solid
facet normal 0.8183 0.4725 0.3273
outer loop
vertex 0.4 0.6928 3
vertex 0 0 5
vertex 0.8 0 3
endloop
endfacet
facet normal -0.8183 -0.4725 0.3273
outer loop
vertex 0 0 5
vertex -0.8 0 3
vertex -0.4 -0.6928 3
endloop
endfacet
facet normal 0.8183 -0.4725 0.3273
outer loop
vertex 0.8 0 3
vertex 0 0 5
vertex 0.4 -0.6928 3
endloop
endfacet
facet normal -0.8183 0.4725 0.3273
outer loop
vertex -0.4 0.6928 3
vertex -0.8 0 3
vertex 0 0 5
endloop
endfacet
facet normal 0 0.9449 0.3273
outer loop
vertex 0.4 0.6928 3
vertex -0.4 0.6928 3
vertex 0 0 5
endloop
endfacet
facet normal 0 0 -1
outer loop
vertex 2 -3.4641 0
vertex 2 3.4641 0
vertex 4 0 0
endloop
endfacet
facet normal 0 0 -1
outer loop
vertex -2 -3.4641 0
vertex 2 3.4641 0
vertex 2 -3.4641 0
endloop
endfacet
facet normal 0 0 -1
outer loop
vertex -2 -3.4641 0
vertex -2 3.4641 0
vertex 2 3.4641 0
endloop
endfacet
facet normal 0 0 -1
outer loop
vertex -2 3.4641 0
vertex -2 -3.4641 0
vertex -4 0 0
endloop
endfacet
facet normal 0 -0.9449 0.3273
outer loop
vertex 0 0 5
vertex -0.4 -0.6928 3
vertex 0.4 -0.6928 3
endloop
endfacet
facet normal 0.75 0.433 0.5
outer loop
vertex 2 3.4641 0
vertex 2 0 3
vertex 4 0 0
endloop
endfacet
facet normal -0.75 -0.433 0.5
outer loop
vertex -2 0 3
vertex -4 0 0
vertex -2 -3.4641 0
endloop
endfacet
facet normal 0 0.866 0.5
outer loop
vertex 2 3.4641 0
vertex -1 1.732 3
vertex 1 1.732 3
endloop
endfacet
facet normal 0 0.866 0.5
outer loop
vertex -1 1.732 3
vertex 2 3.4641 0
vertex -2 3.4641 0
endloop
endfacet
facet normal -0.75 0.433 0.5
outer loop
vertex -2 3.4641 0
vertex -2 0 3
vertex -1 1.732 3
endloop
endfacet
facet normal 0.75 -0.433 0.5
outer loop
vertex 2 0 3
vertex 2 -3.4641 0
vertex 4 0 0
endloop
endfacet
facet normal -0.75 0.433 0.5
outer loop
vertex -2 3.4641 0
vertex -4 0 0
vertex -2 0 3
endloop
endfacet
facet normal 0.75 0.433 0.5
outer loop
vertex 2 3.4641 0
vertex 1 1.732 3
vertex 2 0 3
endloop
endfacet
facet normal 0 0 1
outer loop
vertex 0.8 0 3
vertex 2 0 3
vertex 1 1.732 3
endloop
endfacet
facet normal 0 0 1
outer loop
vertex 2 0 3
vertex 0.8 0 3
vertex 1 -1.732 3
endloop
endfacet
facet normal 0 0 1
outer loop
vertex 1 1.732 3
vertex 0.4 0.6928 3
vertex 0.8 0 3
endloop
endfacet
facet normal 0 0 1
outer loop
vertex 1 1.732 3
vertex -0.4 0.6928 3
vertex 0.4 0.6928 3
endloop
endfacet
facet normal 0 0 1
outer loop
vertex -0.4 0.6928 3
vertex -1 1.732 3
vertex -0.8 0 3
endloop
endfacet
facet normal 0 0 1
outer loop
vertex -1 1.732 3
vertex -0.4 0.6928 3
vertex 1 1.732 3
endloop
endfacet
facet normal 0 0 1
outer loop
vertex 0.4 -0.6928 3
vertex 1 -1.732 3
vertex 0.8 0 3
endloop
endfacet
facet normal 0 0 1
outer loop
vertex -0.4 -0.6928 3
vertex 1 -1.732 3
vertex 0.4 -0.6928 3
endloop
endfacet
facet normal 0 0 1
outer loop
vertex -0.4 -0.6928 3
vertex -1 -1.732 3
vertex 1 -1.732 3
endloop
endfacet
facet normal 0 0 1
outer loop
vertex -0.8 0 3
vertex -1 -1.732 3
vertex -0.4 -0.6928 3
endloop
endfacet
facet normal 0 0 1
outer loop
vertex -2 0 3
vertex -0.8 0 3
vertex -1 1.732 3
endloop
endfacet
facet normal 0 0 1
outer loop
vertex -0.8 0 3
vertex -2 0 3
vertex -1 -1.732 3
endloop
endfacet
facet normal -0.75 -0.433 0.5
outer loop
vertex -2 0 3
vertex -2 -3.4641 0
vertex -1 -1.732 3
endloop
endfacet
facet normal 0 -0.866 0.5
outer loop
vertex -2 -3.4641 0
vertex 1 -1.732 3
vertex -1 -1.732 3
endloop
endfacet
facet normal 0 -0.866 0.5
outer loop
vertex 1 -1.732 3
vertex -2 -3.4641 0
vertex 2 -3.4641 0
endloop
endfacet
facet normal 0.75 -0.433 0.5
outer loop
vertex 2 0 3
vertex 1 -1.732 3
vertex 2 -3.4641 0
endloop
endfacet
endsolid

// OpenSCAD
skinny_cutter();

module cutter(){
    minkowski(){
        linear_extrude(height=5) import("sixfish.dxf", layer="rim");
        cylinder(r1=2, r2=0, h=4, $fn=6);
    }
}

module skinny_cutter(){
    jitter = .45;
    steps = 6;
    s = 2;
    union(){
        //the cutter
        minkowski(){
            cylinder(r1=2, r2=0, h=5, $fn=6);
            intersection_for(n=[0:360/steps:359]){
                rotate([0,0,n]) translate([jitter,0,0]) rotate([0,0,-n]) scale([s,s,1]) linear_extrude(height=7) import("sixfish.dxf", layer="rim");
            }
        }
        
        //border around the bottom
        minkowski(){
            cylinder(r1=4, r2=2, h=3, $fn=6);
            scale([s,s,1]) linear_extrude(height=2) import("sixfish.dxf", layer="rim");
        }
    }
}
